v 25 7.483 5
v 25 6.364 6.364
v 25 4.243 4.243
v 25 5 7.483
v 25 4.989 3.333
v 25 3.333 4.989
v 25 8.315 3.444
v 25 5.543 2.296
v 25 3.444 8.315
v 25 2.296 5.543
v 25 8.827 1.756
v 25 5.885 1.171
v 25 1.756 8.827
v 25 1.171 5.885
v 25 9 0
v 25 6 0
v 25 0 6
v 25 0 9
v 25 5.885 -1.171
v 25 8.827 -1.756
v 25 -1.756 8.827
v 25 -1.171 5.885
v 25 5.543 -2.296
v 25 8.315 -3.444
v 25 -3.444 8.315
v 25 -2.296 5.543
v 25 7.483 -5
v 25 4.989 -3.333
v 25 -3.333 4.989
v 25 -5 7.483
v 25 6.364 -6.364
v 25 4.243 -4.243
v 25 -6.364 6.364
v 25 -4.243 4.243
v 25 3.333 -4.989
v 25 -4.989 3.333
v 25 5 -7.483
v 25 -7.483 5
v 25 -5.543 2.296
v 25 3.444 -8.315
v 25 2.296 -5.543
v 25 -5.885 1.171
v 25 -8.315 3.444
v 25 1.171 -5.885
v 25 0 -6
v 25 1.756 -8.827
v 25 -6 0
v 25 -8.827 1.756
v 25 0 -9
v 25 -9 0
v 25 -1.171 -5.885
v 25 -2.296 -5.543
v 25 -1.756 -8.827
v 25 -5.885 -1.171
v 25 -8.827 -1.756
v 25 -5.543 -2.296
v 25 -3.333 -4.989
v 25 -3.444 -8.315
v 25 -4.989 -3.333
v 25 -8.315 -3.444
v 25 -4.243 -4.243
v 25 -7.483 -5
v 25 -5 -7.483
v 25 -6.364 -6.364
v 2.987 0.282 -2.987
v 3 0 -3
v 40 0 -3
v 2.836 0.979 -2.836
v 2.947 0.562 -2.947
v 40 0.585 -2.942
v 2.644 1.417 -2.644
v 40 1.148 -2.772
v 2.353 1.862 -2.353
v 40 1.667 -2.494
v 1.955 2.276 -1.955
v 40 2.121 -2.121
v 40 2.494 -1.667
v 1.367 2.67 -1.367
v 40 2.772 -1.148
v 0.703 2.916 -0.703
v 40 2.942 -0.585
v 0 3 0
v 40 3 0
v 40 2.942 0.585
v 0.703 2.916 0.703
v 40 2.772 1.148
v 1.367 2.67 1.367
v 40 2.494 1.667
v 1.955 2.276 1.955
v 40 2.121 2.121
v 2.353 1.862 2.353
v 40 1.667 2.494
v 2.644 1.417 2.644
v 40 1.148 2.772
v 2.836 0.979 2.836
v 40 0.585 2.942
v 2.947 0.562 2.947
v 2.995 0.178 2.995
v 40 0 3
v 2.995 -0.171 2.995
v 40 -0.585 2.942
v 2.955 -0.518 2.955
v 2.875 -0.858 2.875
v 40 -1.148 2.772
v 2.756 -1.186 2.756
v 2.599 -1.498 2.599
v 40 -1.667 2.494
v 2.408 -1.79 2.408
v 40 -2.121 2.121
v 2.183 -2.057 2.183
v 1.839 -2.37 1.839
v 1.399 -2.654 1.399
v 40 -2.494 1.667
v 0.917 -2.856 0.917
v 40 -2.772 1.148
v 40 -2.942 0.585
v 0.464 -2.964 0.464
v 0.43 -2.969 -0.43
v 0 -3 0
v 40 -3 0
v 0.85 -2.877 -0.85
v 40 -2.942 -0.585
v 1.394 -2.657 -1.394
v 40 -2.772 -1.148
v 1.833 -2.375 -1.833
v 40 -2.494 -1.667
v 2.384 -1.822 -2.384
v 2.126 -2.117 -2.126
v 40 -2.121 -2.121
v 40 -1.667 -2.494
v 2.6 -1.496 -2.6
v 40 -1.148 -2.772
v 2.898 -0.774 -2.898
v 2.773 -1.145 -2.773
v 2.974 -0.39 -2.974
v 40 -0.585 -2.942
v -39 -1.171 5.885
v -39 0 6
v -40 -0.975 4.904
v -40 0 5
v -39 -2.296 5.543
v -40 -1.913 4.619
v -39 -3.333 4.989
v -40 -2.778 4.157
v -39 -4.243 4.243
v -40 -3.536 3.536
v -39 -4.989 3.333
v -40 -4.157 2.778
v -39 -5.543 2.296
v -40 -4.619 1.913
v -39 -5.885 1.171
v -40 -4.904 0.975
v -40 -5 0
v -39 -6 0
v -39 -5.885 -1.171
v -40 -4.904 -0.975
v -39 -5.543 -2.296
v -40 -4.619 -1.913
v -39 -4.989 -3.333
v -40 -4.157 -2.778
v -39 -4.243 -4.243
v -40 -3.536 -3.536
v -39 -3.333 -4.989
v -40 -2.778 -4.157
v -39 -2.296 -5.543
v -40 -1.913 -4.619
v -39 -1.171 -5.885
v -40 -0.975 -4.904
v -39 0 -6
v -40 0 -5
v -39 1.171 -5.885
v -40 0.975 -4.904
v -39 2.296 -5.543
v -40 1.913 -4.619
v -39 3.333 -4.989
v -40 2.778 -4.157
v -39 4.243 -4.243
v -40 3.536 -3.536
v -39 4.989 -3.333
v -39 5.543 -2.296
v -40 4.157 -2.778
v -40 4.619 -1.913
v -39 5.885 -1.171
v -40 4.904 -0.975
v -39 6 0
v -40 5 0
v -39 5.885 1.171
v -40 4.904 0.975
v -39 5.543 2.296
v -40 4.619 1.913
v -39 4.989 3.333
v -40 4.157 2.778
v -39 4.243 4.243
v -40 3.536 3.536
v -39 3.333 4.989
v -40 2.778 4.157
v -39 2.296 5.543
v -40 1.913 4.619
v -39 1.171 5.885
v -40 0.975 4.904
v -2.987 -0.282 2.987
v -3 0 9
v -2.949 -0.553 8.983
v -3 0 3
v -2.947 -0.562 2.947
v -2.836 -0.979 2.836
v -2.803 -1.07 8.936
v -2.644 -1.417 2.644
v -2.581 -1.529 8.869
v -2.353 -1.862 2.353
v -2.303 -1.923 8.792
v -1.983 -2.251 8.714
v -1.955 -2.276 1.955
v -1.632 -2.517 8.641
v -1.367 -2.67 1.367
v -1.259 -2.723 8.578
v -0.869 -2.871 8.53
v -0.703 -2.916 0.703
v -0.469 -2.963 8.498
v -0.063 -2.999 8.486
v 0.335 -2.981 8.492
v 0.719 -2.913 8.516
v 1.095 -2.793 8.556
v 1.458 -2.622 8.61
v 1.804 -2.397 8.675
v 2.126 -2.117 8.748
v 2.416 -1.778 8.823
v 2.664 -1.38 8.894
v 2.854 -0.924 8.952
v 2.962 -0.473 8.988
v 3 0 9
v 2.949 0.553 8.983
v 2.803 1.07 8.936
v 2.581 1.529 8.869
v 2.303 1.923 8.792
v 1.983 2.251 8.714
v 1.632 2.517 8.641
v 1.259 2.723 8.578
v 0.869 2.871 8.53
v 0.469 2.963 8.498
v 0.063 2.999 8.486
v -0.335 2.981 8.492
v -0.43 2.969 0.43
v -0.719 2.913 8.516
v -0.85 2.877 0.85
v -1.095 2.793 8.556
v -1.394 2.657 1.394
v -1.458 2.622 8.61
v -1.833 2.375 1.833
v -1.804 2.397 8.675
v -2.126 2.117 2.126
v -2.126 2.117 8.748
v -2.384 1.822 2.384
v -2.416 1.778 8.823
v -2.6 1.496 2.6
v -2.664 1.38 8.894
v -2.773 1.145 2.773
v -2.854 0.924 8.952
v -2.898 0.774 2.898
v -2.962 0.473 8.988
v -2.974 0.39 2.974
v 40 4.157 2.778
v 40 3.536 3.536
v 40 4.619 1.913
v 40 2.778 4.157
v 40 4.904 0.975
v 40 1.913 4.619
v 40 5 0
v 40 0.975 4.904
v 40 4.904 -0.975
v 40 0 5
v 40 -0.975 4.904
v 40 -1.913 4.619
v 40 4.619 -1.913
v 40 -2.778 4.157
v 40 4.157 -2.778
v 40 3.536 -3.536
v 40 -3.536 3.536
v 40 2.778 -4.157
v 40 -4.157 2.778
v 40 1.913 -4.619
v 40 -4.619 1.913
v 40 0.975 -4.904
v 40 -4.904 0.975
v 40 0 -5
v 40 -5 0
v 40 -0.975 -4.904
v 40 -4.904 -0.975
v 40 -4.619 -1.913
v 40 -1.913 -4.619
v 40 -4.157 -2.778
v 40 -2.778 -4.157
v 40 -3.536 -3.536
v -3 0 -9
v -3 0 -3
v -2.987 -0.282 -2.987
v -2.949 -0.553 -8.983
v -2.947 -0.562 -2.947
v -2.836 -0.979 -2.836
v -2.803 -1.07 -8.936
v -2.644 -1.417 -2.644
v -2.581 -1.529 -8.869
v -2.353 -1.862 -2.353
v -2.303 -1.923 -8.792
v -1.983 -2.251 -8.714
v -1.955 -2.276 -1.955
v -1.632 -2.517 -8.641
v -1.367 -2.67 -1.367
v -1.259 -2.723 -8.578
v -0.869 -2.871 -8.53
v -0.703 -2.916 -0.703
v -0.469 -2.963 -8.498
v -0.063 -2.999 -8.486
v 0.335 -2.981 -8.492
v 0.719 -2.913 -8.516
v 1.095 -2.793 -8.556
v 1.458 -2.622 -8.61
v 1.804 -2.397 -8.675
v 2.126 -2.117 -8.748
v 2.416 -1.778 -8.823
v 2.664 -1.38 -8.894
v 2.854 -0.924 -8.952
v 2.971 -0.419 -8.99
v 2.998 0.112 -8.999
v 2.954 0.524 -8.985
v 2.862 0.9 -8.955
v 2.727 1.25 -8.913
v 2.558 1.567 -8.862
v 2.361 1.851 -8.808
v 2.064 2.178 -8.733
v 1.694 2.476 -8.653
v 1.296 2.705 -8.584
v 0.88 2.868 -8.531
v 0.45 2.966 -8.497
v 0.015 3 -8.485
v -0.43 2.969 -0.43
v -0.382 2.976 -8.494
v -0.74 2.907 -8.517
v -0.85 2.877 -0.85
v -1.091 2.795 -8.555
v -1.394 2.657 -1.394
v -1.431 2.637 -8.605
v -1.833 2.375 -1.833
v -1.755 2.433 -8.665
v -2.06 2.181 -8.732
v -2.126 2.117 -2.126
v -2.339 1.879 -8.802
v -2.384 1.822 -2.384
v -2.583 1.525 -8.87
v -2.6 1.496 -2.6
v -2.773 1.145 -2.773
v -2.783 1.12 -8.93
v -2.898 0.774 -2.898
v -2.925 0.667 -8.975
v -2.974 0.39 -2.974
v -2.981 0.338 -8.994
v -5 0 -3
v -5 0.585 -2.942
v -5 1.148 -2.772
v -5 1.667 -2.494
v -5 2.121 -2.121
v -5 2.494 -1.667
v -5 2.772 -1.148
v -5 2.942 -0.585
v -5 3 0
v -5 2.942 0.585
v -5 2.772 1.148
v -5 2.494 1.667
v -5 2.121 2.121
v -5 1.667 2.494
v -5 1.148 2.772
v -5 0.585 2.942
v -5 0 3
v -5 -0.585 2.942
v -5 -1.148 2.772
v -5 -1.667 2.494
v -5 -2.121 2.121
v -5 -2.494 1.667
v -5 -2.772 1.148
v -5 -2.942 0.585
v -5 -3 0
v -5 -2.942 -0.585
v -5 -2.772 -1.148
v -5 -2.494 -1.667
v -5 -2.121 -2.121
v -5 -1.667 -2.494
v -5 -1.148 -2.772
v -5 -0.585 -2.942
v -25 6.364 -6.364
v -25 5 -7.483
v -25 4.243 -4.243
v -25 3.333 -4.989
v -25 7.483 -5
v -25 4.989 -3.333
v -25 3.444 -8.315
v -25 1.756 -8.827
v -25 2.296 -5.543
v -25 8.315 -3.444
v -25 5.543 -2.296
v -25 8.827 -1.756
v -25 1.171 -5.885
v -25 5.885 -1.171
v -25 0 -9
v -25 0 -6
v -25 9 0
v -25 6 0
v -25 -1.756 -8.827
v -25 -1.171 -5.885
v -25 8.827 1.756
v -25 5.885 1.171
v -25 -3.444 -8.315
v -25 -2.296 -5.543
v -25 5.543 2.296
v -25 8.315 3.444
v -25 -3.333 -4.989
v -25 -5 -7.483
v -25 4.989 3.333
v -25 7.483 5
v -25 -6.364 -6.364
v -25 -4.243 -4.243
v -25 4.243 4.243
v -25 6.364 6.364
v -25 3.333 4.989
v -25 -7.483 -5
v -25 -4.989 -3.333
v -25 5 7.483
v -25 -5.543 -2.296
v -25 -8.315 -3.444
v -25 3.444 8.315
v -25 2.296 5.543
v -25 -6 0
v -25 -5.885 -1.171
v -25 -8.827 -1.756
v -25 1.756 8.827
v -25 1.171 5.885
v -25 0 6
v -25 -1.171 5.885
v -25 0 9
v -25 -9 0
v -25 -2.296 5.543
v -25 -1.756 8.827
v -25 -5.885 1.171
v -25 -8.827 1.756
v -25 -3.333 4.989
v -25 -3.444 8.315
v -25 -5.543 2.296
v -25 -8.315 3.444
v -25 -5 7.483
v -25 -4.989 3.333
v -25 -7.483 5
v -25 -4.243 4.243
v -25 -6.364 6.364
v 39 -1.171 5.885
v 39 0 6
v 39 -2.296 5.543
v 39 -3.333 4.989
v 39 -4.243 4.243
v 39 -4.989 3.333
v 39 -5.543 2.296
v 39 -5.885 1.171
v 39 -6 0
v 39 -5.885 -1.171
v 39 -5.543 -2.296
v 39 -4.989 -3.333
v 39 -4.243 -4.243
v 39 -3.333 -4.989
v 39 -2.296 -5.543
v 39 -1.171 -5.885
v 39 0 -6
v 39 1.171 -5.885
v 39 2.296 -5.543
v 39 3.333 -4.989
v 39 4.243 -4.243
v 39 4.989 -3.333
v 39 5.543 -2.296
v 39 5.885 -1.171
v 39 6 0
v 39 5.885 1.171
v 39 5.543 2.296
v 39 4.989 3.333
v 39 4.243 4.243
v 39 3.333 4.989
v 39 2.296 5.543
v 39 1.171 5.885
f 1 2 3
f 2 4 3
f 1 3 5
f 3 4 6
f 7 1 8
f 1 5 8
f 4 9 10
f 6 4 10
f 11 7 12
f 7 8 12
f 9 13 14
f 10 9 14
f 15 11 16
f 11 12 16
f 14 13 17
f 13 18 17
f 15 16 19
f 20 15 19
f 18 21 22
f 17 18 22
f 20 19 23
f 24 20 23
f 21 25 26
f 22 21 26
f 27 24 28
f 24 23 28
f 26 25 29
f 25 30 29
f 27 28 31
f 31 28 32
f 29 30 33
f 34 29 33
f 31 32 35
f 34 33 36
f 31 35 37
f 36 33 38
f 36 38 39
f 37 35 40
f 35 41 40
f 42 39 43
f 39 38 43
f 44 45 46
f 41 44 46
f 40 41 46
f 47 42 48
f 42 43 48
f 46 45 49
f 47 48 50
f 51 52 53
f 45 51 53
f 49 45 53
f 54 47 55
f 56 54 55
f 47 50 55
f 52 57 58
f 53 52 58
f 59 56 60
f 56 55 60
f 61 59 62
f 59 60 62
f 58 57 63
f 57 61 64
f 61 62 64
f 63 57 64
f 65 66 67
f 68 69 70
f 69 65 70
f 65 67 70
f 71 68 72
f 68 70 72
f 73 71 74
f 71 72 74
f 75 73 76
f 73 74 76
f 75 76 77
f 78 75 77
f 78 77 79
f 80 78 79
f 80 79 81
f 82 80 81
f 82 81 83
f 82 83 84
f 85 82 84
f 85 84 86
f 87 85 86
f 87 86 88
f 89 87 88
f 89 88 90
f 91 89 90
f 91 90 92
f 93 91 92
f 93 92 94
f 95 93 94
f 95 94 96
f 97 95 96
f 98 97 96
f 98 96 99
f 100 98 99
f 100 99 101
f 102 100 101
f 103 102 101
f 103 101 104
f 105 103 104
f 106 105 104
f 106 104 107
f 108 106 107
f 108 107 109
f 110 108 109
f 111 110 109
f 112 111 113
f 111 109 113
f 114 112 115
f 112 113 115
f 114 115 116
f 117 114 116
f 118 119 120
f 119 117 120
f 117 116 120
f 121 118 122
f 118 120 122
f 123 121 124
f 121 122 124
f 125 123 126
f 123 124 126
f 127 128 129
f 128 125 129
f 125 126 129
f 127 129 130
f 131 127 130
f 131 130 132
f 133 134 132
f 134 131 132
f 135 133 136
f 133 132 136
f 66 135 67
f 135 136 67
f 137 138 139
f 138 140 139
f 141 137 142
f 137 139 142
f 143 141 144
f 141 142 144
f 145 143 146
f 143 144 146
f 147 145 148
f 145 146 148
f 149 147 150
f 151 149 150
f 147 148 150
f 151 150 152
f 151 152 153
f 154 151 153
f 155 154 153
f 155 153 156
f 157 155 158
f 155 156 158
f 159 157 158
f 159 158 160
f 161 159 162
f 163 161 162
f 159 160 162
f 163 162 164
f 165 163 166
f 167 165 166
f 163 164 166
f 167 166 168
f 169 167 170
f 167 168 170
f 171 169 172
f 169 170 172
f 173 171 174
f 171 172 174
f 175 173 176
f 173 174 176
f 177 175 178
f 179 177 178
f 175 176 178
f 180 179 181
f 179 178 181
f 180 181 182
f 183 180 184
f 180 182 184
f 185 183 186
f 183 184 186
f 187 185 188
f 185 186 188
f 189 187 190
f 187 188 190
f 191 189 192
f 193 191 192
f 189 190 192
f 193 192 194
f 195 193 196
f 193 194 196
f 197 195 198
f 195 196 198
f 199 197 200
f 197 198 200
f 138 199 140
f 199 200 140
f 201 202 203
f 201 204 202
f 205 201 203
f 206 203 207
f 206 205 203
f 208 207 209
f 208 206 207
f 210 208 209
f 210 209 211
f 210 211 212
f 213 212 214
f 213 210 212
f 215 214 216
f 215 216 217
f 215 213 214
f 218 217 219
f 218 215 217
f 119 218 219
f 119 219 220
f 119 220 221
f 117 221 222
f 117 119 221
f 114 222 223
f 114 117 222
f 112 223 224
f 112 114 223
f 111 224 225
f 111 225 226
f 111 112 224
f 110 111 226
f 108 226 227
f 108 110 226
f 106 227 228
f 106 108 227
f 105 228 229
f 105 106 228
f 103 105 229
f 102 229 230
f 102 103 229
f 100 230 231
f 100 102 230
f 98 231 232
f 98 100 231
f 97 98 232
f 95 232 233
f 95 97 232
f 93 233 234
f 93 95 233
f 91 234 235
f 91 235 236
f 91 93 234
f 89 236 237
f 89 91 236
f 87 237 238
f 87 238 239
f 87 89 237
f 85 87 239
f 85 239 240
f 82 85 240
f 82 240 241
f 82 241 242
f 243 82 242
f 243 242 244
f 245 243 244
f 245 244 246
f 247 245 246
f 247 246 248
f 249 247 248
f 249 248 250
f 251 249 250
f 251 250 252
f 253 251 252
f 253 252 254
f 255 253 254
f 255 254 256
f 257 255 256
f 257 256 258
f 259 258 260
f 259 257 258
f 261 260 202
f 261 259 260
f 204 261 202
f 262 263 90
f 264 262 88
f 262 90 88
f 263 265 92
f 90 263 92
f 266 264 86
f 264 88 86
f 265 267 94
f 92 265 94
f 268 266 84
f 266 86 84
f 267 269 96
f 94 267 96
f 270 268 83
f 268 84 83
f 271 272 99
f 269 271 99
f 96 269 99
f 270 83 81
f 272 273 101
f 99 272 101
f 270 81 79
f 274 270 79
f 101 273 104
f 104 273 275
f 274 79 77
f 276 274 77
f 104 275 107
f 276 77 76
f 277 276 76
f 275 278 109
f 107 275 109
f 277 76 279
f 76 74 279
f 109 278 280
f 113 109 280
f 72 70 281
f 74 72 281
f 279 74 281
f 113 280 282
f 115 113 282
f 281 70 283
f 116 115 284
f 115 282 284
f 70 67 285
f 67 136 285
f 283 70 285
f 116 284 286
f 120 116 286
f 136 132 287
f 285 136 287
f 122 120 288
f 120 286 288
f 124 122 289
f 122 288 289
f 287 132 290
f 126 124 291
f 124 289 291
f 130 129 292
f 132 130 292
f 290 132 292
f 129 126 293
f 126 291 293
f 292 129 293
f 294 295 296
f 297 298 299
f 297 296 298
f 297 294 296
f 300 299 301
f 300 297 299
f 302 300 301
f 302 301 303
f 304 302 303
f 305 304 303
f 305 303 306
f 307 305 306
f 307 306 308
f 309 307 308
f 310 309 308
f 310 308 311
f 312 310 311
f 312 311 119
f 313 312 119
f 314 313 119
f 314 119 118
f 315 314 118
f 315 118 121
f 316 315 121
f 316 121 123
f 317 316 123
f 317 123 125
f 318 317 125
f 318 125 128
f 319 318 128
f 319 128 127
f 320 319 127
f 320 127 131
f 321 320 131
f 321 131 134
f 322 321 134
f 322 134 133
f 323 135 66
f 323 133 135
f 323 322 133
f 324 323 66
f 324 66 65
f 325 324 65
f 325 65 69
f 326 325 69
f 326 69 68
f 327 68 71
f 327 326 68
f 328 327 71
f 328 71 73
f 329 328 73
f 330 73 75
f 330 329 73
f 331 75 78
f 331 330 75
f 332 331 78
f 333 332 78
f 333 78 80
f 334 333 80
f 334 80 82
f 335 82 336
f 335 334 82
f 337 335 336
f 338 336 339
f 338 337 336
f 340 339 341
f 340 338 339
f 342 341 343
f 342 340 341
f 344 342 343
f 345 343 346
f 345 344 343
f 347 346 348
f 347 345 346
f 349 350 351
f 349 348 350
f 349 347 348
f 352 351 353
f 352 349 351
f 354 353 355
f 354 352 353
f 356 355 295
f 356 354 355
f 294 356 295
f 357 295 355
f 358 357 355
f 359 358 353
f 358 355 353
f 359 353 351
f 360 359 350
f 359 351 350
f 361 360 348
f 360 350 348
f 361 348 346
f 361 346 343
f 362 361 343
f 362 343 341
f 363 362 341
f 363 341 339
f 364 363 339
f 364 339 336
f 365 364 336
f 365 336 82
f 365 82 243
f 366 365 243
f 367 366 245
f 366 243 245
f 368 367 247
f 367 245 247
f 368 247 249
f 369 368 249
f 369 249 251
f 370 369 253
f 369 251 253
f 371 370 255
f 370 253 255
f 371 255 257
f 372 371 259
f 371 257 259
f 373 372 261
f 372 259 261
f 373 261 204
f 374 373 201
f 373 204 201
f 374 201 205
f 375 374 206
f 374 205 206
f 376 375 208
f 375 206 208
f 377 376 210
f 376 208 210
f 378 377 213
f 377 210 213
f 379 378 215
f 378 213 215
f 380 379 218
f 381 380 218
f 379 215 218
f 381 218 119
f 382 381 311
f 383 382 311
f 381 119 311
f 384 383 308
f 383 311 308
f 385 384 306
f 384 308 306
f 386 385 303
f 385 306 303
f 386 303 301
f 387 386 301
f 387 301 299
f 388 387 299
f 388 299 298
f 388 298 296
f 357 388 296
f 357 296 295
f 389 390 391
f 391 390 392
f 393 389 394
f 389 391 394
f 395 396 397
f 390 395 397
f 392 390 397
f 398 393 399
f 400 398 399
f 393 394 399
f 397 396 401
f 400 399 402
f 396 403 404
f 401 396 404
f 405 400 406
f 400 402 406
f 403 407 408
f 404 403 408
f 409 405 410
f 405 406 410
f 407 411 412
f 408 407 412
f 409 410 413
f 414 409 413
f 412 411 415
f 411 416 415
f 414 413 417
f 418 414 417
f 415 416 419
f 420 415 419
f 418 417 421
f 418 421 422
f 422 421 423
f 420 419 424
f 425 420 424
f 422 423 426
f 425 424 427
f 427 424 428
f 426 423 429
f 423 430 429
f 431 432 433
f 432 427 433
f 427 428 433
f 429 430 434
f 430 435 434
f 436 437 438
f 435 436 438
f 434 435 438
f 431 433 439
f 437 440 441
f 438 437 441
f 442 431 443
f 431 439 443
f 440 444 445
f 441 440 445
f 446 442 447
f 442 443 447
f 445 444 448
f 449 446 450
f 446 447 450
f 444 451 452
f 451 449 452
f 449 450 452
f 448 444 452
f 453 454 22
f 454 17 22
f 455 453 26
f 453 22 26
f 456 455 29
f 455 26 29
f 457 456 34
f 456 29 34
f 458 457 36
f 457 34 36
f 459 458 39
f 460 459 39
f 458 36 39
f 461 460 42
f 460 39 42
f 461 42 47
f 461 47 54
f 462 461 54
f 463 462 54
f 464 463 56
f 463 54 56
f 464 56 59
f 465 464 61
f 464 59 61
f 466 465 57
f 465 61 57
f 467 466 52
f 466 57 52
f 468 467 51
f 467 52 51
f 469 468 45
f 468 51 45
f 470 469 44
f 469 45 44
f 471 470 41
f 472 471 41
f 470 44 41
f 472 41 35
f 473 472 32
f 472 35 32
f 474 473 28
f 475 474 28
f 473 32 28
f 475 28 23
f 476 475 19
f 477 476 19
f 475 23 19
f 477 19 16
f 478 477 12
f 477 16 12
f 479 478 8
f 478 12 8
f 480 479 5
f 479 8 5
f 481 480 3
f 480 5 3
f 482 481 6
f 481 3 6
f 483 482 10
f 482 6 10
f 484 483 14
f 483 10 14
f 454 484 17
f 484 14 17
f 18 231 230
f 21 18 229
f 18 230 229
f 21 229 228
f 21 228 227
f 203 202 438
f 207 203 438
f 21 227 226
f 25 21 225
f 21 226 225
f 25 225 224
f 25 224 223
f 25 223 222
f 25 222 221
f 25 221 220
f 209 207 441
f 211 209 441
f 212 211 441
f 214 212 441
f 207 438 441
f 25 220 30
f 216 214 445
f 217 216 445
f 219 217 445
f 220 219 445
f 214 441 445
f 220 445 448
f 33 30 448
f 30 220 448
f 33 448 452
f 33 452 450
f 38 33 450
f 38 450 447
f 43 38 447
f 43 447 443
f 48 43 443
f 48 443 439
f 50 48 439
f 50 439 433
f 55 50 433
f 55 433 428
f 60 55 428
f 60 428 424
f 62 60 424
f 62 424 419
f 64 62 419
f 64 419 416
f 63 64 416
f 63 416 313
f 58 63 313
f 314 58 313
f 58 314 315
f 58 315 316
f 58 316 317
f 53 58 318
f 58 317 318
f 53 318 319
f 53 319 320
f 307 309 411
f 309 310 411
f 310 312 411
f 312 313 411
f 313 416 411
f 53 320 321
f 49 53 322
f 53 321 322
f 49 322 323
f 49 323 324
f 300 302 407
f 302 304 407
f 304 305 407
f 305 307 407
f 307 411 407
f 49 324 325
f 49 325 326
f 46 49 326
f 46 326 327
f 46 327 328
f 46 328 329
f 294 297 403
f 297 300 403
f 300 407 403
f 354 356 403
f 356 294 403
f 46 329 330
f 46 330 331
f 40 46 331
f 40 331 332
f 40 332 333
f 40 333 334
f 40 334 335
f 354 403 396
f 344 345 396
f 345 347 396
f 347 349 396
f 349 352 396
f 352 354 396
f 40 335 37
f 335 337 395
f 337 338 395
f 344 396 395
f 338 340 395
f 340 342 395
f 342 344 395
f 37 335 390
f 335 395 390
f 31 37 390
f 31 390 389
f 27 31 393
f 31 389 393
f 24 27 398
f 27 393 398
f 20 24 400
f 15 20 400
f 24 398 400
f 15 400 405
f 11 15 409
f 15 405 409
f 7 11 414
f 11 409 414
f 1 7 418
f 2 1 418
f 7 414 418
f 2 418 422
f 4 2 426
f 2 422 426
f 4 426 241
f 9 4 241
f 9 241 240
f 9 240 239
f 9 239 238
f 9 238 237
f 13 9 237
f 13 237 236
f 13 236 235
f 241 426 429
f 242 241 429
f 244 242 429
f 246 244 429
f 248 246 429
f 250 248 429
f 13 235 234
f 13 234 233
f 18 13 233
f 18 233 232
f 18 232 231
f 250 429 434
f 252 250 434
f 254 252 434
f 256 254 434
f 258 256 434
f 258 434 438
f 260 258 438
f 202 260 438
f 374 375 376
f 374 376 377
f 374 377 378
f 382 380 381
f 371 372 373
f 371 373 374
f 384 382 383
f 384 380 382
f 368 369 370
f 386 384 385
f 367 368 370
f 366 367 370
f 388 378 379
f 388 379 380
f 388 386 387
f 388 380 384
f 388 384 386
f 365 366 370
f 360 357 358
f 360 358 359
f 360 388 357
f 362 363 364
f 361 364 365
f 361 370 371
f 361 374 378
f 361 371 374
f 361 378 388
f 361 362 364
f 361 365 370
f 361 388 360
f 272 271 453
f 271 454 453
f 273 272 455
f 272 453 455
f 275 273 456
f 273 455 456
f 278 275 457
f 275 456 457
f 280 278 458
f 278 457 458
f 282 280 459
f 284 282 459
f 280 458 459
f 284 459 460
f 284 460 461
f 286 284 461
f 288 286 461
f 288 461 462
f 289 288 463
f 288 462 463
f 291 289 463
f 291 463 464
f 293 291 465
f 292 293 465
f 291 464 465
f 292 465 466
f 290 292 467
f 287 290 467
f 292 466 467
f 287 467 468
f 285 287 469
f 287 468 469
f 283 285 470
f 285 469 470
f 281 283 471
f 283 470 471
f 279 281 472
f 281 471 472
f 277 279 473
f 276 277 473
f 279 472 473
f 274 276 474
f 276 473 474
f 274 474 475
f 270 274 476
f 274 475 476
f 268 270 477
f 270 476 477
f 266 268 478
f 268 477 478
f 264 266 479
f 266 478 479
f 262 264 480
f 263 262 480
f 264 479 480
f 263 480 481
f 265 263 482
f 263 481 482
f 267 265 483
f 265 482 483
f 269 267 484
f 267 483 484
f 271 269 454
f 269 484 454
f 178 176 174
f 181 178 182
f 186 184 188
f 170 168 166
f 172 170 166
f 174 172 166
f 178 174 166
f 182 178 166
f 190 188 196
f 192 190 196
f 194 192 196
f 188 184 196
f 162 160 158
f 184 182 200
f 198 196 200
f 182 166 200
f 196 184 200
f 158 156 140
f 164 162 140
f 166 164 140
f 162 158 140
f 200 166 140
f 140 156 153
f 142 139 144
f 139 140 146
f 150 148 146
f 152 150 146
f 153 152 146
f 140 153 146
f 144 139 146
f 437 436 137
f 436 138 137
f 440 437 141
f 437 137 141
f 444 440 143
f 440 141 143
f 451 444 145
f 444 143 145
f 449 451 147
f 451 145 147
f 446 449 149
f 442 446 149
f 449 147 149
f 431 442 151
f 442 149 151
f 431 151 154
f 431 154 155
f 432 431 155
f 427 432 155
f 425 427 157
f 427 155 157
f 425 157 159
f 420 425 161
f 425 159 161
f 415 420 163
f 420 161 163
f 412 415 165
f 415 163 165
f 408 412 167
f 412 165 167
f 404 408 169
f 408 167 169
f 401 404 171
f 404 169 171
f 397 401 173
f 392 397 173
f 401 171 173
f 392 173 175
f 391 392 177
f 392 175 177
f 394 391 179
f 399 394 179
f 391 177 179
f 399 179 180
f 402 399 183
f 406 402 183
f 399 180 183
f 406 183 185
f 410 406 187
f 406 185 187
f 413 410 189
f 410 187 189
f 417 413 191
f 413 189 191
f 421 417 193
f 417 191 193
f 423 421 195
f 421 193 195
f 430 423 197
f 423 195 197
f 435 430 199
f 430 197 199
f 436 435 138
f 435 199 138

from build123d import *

# Parameters (mm, degrees)
CUT_EXTRUDE2_DEPTH      = 22
CUT_EXTRUDE2_DEPTH_BACK = 21
SKETCH2_R               = 3
SKETCH3_R               = 3
CUT_EXTRUDE3_DEPTH      = 45


with BuildPart() as part:
    # Sketch1 → Revolve1 (revolve)
    with BuildSketch(Plane.XY, mode=Mode.PRIVATE) as revolve1_sk:
        Polygon((-40, 0), (40, 0), (40, 5), (39, 6), (25, 6), (25, 9), (-25, 9), (-25, 6), (-39, 6), (-40, 5), align=None)
    revolve(revolve1_sk.sketch.rotate(Axis((-40, 0, 0), (1, 0, 0)), 90), axis=Axis((-40, 0, 0), (1, 0, 0)))

    # Sketch2 → Cut-Extrude2 (cut, two sides: drawn at the far end of the back side and taken through both)
    with BuildSketch(Plane.XY.offset(-CUT_EXTRUDE2_DEPTH_BACK)):
        with Locations(Location((0, 0, 0), (0, 0, 180))):
            Circle(SKETCH2_R)
    extrude(amount=CUT_EXTRUDE2_DEPTH + CUT_EXTRUDE2_DEPTH_BACK, mode=Mode.SUBTRACT)

    # Sketch3 → Cut-Extrude3 (cut)
    with BuildSketch(Plane(origin=(40, 0, 0), x_dir=(0, 0, -1), z_dir=(1, 0, 0))):
        Circle(SKETCH3_R)
    extrude(amount=-CUT_EXTRUDE3_DEPTH, mode=Mode.SUBTRACT)


solid = part.part
